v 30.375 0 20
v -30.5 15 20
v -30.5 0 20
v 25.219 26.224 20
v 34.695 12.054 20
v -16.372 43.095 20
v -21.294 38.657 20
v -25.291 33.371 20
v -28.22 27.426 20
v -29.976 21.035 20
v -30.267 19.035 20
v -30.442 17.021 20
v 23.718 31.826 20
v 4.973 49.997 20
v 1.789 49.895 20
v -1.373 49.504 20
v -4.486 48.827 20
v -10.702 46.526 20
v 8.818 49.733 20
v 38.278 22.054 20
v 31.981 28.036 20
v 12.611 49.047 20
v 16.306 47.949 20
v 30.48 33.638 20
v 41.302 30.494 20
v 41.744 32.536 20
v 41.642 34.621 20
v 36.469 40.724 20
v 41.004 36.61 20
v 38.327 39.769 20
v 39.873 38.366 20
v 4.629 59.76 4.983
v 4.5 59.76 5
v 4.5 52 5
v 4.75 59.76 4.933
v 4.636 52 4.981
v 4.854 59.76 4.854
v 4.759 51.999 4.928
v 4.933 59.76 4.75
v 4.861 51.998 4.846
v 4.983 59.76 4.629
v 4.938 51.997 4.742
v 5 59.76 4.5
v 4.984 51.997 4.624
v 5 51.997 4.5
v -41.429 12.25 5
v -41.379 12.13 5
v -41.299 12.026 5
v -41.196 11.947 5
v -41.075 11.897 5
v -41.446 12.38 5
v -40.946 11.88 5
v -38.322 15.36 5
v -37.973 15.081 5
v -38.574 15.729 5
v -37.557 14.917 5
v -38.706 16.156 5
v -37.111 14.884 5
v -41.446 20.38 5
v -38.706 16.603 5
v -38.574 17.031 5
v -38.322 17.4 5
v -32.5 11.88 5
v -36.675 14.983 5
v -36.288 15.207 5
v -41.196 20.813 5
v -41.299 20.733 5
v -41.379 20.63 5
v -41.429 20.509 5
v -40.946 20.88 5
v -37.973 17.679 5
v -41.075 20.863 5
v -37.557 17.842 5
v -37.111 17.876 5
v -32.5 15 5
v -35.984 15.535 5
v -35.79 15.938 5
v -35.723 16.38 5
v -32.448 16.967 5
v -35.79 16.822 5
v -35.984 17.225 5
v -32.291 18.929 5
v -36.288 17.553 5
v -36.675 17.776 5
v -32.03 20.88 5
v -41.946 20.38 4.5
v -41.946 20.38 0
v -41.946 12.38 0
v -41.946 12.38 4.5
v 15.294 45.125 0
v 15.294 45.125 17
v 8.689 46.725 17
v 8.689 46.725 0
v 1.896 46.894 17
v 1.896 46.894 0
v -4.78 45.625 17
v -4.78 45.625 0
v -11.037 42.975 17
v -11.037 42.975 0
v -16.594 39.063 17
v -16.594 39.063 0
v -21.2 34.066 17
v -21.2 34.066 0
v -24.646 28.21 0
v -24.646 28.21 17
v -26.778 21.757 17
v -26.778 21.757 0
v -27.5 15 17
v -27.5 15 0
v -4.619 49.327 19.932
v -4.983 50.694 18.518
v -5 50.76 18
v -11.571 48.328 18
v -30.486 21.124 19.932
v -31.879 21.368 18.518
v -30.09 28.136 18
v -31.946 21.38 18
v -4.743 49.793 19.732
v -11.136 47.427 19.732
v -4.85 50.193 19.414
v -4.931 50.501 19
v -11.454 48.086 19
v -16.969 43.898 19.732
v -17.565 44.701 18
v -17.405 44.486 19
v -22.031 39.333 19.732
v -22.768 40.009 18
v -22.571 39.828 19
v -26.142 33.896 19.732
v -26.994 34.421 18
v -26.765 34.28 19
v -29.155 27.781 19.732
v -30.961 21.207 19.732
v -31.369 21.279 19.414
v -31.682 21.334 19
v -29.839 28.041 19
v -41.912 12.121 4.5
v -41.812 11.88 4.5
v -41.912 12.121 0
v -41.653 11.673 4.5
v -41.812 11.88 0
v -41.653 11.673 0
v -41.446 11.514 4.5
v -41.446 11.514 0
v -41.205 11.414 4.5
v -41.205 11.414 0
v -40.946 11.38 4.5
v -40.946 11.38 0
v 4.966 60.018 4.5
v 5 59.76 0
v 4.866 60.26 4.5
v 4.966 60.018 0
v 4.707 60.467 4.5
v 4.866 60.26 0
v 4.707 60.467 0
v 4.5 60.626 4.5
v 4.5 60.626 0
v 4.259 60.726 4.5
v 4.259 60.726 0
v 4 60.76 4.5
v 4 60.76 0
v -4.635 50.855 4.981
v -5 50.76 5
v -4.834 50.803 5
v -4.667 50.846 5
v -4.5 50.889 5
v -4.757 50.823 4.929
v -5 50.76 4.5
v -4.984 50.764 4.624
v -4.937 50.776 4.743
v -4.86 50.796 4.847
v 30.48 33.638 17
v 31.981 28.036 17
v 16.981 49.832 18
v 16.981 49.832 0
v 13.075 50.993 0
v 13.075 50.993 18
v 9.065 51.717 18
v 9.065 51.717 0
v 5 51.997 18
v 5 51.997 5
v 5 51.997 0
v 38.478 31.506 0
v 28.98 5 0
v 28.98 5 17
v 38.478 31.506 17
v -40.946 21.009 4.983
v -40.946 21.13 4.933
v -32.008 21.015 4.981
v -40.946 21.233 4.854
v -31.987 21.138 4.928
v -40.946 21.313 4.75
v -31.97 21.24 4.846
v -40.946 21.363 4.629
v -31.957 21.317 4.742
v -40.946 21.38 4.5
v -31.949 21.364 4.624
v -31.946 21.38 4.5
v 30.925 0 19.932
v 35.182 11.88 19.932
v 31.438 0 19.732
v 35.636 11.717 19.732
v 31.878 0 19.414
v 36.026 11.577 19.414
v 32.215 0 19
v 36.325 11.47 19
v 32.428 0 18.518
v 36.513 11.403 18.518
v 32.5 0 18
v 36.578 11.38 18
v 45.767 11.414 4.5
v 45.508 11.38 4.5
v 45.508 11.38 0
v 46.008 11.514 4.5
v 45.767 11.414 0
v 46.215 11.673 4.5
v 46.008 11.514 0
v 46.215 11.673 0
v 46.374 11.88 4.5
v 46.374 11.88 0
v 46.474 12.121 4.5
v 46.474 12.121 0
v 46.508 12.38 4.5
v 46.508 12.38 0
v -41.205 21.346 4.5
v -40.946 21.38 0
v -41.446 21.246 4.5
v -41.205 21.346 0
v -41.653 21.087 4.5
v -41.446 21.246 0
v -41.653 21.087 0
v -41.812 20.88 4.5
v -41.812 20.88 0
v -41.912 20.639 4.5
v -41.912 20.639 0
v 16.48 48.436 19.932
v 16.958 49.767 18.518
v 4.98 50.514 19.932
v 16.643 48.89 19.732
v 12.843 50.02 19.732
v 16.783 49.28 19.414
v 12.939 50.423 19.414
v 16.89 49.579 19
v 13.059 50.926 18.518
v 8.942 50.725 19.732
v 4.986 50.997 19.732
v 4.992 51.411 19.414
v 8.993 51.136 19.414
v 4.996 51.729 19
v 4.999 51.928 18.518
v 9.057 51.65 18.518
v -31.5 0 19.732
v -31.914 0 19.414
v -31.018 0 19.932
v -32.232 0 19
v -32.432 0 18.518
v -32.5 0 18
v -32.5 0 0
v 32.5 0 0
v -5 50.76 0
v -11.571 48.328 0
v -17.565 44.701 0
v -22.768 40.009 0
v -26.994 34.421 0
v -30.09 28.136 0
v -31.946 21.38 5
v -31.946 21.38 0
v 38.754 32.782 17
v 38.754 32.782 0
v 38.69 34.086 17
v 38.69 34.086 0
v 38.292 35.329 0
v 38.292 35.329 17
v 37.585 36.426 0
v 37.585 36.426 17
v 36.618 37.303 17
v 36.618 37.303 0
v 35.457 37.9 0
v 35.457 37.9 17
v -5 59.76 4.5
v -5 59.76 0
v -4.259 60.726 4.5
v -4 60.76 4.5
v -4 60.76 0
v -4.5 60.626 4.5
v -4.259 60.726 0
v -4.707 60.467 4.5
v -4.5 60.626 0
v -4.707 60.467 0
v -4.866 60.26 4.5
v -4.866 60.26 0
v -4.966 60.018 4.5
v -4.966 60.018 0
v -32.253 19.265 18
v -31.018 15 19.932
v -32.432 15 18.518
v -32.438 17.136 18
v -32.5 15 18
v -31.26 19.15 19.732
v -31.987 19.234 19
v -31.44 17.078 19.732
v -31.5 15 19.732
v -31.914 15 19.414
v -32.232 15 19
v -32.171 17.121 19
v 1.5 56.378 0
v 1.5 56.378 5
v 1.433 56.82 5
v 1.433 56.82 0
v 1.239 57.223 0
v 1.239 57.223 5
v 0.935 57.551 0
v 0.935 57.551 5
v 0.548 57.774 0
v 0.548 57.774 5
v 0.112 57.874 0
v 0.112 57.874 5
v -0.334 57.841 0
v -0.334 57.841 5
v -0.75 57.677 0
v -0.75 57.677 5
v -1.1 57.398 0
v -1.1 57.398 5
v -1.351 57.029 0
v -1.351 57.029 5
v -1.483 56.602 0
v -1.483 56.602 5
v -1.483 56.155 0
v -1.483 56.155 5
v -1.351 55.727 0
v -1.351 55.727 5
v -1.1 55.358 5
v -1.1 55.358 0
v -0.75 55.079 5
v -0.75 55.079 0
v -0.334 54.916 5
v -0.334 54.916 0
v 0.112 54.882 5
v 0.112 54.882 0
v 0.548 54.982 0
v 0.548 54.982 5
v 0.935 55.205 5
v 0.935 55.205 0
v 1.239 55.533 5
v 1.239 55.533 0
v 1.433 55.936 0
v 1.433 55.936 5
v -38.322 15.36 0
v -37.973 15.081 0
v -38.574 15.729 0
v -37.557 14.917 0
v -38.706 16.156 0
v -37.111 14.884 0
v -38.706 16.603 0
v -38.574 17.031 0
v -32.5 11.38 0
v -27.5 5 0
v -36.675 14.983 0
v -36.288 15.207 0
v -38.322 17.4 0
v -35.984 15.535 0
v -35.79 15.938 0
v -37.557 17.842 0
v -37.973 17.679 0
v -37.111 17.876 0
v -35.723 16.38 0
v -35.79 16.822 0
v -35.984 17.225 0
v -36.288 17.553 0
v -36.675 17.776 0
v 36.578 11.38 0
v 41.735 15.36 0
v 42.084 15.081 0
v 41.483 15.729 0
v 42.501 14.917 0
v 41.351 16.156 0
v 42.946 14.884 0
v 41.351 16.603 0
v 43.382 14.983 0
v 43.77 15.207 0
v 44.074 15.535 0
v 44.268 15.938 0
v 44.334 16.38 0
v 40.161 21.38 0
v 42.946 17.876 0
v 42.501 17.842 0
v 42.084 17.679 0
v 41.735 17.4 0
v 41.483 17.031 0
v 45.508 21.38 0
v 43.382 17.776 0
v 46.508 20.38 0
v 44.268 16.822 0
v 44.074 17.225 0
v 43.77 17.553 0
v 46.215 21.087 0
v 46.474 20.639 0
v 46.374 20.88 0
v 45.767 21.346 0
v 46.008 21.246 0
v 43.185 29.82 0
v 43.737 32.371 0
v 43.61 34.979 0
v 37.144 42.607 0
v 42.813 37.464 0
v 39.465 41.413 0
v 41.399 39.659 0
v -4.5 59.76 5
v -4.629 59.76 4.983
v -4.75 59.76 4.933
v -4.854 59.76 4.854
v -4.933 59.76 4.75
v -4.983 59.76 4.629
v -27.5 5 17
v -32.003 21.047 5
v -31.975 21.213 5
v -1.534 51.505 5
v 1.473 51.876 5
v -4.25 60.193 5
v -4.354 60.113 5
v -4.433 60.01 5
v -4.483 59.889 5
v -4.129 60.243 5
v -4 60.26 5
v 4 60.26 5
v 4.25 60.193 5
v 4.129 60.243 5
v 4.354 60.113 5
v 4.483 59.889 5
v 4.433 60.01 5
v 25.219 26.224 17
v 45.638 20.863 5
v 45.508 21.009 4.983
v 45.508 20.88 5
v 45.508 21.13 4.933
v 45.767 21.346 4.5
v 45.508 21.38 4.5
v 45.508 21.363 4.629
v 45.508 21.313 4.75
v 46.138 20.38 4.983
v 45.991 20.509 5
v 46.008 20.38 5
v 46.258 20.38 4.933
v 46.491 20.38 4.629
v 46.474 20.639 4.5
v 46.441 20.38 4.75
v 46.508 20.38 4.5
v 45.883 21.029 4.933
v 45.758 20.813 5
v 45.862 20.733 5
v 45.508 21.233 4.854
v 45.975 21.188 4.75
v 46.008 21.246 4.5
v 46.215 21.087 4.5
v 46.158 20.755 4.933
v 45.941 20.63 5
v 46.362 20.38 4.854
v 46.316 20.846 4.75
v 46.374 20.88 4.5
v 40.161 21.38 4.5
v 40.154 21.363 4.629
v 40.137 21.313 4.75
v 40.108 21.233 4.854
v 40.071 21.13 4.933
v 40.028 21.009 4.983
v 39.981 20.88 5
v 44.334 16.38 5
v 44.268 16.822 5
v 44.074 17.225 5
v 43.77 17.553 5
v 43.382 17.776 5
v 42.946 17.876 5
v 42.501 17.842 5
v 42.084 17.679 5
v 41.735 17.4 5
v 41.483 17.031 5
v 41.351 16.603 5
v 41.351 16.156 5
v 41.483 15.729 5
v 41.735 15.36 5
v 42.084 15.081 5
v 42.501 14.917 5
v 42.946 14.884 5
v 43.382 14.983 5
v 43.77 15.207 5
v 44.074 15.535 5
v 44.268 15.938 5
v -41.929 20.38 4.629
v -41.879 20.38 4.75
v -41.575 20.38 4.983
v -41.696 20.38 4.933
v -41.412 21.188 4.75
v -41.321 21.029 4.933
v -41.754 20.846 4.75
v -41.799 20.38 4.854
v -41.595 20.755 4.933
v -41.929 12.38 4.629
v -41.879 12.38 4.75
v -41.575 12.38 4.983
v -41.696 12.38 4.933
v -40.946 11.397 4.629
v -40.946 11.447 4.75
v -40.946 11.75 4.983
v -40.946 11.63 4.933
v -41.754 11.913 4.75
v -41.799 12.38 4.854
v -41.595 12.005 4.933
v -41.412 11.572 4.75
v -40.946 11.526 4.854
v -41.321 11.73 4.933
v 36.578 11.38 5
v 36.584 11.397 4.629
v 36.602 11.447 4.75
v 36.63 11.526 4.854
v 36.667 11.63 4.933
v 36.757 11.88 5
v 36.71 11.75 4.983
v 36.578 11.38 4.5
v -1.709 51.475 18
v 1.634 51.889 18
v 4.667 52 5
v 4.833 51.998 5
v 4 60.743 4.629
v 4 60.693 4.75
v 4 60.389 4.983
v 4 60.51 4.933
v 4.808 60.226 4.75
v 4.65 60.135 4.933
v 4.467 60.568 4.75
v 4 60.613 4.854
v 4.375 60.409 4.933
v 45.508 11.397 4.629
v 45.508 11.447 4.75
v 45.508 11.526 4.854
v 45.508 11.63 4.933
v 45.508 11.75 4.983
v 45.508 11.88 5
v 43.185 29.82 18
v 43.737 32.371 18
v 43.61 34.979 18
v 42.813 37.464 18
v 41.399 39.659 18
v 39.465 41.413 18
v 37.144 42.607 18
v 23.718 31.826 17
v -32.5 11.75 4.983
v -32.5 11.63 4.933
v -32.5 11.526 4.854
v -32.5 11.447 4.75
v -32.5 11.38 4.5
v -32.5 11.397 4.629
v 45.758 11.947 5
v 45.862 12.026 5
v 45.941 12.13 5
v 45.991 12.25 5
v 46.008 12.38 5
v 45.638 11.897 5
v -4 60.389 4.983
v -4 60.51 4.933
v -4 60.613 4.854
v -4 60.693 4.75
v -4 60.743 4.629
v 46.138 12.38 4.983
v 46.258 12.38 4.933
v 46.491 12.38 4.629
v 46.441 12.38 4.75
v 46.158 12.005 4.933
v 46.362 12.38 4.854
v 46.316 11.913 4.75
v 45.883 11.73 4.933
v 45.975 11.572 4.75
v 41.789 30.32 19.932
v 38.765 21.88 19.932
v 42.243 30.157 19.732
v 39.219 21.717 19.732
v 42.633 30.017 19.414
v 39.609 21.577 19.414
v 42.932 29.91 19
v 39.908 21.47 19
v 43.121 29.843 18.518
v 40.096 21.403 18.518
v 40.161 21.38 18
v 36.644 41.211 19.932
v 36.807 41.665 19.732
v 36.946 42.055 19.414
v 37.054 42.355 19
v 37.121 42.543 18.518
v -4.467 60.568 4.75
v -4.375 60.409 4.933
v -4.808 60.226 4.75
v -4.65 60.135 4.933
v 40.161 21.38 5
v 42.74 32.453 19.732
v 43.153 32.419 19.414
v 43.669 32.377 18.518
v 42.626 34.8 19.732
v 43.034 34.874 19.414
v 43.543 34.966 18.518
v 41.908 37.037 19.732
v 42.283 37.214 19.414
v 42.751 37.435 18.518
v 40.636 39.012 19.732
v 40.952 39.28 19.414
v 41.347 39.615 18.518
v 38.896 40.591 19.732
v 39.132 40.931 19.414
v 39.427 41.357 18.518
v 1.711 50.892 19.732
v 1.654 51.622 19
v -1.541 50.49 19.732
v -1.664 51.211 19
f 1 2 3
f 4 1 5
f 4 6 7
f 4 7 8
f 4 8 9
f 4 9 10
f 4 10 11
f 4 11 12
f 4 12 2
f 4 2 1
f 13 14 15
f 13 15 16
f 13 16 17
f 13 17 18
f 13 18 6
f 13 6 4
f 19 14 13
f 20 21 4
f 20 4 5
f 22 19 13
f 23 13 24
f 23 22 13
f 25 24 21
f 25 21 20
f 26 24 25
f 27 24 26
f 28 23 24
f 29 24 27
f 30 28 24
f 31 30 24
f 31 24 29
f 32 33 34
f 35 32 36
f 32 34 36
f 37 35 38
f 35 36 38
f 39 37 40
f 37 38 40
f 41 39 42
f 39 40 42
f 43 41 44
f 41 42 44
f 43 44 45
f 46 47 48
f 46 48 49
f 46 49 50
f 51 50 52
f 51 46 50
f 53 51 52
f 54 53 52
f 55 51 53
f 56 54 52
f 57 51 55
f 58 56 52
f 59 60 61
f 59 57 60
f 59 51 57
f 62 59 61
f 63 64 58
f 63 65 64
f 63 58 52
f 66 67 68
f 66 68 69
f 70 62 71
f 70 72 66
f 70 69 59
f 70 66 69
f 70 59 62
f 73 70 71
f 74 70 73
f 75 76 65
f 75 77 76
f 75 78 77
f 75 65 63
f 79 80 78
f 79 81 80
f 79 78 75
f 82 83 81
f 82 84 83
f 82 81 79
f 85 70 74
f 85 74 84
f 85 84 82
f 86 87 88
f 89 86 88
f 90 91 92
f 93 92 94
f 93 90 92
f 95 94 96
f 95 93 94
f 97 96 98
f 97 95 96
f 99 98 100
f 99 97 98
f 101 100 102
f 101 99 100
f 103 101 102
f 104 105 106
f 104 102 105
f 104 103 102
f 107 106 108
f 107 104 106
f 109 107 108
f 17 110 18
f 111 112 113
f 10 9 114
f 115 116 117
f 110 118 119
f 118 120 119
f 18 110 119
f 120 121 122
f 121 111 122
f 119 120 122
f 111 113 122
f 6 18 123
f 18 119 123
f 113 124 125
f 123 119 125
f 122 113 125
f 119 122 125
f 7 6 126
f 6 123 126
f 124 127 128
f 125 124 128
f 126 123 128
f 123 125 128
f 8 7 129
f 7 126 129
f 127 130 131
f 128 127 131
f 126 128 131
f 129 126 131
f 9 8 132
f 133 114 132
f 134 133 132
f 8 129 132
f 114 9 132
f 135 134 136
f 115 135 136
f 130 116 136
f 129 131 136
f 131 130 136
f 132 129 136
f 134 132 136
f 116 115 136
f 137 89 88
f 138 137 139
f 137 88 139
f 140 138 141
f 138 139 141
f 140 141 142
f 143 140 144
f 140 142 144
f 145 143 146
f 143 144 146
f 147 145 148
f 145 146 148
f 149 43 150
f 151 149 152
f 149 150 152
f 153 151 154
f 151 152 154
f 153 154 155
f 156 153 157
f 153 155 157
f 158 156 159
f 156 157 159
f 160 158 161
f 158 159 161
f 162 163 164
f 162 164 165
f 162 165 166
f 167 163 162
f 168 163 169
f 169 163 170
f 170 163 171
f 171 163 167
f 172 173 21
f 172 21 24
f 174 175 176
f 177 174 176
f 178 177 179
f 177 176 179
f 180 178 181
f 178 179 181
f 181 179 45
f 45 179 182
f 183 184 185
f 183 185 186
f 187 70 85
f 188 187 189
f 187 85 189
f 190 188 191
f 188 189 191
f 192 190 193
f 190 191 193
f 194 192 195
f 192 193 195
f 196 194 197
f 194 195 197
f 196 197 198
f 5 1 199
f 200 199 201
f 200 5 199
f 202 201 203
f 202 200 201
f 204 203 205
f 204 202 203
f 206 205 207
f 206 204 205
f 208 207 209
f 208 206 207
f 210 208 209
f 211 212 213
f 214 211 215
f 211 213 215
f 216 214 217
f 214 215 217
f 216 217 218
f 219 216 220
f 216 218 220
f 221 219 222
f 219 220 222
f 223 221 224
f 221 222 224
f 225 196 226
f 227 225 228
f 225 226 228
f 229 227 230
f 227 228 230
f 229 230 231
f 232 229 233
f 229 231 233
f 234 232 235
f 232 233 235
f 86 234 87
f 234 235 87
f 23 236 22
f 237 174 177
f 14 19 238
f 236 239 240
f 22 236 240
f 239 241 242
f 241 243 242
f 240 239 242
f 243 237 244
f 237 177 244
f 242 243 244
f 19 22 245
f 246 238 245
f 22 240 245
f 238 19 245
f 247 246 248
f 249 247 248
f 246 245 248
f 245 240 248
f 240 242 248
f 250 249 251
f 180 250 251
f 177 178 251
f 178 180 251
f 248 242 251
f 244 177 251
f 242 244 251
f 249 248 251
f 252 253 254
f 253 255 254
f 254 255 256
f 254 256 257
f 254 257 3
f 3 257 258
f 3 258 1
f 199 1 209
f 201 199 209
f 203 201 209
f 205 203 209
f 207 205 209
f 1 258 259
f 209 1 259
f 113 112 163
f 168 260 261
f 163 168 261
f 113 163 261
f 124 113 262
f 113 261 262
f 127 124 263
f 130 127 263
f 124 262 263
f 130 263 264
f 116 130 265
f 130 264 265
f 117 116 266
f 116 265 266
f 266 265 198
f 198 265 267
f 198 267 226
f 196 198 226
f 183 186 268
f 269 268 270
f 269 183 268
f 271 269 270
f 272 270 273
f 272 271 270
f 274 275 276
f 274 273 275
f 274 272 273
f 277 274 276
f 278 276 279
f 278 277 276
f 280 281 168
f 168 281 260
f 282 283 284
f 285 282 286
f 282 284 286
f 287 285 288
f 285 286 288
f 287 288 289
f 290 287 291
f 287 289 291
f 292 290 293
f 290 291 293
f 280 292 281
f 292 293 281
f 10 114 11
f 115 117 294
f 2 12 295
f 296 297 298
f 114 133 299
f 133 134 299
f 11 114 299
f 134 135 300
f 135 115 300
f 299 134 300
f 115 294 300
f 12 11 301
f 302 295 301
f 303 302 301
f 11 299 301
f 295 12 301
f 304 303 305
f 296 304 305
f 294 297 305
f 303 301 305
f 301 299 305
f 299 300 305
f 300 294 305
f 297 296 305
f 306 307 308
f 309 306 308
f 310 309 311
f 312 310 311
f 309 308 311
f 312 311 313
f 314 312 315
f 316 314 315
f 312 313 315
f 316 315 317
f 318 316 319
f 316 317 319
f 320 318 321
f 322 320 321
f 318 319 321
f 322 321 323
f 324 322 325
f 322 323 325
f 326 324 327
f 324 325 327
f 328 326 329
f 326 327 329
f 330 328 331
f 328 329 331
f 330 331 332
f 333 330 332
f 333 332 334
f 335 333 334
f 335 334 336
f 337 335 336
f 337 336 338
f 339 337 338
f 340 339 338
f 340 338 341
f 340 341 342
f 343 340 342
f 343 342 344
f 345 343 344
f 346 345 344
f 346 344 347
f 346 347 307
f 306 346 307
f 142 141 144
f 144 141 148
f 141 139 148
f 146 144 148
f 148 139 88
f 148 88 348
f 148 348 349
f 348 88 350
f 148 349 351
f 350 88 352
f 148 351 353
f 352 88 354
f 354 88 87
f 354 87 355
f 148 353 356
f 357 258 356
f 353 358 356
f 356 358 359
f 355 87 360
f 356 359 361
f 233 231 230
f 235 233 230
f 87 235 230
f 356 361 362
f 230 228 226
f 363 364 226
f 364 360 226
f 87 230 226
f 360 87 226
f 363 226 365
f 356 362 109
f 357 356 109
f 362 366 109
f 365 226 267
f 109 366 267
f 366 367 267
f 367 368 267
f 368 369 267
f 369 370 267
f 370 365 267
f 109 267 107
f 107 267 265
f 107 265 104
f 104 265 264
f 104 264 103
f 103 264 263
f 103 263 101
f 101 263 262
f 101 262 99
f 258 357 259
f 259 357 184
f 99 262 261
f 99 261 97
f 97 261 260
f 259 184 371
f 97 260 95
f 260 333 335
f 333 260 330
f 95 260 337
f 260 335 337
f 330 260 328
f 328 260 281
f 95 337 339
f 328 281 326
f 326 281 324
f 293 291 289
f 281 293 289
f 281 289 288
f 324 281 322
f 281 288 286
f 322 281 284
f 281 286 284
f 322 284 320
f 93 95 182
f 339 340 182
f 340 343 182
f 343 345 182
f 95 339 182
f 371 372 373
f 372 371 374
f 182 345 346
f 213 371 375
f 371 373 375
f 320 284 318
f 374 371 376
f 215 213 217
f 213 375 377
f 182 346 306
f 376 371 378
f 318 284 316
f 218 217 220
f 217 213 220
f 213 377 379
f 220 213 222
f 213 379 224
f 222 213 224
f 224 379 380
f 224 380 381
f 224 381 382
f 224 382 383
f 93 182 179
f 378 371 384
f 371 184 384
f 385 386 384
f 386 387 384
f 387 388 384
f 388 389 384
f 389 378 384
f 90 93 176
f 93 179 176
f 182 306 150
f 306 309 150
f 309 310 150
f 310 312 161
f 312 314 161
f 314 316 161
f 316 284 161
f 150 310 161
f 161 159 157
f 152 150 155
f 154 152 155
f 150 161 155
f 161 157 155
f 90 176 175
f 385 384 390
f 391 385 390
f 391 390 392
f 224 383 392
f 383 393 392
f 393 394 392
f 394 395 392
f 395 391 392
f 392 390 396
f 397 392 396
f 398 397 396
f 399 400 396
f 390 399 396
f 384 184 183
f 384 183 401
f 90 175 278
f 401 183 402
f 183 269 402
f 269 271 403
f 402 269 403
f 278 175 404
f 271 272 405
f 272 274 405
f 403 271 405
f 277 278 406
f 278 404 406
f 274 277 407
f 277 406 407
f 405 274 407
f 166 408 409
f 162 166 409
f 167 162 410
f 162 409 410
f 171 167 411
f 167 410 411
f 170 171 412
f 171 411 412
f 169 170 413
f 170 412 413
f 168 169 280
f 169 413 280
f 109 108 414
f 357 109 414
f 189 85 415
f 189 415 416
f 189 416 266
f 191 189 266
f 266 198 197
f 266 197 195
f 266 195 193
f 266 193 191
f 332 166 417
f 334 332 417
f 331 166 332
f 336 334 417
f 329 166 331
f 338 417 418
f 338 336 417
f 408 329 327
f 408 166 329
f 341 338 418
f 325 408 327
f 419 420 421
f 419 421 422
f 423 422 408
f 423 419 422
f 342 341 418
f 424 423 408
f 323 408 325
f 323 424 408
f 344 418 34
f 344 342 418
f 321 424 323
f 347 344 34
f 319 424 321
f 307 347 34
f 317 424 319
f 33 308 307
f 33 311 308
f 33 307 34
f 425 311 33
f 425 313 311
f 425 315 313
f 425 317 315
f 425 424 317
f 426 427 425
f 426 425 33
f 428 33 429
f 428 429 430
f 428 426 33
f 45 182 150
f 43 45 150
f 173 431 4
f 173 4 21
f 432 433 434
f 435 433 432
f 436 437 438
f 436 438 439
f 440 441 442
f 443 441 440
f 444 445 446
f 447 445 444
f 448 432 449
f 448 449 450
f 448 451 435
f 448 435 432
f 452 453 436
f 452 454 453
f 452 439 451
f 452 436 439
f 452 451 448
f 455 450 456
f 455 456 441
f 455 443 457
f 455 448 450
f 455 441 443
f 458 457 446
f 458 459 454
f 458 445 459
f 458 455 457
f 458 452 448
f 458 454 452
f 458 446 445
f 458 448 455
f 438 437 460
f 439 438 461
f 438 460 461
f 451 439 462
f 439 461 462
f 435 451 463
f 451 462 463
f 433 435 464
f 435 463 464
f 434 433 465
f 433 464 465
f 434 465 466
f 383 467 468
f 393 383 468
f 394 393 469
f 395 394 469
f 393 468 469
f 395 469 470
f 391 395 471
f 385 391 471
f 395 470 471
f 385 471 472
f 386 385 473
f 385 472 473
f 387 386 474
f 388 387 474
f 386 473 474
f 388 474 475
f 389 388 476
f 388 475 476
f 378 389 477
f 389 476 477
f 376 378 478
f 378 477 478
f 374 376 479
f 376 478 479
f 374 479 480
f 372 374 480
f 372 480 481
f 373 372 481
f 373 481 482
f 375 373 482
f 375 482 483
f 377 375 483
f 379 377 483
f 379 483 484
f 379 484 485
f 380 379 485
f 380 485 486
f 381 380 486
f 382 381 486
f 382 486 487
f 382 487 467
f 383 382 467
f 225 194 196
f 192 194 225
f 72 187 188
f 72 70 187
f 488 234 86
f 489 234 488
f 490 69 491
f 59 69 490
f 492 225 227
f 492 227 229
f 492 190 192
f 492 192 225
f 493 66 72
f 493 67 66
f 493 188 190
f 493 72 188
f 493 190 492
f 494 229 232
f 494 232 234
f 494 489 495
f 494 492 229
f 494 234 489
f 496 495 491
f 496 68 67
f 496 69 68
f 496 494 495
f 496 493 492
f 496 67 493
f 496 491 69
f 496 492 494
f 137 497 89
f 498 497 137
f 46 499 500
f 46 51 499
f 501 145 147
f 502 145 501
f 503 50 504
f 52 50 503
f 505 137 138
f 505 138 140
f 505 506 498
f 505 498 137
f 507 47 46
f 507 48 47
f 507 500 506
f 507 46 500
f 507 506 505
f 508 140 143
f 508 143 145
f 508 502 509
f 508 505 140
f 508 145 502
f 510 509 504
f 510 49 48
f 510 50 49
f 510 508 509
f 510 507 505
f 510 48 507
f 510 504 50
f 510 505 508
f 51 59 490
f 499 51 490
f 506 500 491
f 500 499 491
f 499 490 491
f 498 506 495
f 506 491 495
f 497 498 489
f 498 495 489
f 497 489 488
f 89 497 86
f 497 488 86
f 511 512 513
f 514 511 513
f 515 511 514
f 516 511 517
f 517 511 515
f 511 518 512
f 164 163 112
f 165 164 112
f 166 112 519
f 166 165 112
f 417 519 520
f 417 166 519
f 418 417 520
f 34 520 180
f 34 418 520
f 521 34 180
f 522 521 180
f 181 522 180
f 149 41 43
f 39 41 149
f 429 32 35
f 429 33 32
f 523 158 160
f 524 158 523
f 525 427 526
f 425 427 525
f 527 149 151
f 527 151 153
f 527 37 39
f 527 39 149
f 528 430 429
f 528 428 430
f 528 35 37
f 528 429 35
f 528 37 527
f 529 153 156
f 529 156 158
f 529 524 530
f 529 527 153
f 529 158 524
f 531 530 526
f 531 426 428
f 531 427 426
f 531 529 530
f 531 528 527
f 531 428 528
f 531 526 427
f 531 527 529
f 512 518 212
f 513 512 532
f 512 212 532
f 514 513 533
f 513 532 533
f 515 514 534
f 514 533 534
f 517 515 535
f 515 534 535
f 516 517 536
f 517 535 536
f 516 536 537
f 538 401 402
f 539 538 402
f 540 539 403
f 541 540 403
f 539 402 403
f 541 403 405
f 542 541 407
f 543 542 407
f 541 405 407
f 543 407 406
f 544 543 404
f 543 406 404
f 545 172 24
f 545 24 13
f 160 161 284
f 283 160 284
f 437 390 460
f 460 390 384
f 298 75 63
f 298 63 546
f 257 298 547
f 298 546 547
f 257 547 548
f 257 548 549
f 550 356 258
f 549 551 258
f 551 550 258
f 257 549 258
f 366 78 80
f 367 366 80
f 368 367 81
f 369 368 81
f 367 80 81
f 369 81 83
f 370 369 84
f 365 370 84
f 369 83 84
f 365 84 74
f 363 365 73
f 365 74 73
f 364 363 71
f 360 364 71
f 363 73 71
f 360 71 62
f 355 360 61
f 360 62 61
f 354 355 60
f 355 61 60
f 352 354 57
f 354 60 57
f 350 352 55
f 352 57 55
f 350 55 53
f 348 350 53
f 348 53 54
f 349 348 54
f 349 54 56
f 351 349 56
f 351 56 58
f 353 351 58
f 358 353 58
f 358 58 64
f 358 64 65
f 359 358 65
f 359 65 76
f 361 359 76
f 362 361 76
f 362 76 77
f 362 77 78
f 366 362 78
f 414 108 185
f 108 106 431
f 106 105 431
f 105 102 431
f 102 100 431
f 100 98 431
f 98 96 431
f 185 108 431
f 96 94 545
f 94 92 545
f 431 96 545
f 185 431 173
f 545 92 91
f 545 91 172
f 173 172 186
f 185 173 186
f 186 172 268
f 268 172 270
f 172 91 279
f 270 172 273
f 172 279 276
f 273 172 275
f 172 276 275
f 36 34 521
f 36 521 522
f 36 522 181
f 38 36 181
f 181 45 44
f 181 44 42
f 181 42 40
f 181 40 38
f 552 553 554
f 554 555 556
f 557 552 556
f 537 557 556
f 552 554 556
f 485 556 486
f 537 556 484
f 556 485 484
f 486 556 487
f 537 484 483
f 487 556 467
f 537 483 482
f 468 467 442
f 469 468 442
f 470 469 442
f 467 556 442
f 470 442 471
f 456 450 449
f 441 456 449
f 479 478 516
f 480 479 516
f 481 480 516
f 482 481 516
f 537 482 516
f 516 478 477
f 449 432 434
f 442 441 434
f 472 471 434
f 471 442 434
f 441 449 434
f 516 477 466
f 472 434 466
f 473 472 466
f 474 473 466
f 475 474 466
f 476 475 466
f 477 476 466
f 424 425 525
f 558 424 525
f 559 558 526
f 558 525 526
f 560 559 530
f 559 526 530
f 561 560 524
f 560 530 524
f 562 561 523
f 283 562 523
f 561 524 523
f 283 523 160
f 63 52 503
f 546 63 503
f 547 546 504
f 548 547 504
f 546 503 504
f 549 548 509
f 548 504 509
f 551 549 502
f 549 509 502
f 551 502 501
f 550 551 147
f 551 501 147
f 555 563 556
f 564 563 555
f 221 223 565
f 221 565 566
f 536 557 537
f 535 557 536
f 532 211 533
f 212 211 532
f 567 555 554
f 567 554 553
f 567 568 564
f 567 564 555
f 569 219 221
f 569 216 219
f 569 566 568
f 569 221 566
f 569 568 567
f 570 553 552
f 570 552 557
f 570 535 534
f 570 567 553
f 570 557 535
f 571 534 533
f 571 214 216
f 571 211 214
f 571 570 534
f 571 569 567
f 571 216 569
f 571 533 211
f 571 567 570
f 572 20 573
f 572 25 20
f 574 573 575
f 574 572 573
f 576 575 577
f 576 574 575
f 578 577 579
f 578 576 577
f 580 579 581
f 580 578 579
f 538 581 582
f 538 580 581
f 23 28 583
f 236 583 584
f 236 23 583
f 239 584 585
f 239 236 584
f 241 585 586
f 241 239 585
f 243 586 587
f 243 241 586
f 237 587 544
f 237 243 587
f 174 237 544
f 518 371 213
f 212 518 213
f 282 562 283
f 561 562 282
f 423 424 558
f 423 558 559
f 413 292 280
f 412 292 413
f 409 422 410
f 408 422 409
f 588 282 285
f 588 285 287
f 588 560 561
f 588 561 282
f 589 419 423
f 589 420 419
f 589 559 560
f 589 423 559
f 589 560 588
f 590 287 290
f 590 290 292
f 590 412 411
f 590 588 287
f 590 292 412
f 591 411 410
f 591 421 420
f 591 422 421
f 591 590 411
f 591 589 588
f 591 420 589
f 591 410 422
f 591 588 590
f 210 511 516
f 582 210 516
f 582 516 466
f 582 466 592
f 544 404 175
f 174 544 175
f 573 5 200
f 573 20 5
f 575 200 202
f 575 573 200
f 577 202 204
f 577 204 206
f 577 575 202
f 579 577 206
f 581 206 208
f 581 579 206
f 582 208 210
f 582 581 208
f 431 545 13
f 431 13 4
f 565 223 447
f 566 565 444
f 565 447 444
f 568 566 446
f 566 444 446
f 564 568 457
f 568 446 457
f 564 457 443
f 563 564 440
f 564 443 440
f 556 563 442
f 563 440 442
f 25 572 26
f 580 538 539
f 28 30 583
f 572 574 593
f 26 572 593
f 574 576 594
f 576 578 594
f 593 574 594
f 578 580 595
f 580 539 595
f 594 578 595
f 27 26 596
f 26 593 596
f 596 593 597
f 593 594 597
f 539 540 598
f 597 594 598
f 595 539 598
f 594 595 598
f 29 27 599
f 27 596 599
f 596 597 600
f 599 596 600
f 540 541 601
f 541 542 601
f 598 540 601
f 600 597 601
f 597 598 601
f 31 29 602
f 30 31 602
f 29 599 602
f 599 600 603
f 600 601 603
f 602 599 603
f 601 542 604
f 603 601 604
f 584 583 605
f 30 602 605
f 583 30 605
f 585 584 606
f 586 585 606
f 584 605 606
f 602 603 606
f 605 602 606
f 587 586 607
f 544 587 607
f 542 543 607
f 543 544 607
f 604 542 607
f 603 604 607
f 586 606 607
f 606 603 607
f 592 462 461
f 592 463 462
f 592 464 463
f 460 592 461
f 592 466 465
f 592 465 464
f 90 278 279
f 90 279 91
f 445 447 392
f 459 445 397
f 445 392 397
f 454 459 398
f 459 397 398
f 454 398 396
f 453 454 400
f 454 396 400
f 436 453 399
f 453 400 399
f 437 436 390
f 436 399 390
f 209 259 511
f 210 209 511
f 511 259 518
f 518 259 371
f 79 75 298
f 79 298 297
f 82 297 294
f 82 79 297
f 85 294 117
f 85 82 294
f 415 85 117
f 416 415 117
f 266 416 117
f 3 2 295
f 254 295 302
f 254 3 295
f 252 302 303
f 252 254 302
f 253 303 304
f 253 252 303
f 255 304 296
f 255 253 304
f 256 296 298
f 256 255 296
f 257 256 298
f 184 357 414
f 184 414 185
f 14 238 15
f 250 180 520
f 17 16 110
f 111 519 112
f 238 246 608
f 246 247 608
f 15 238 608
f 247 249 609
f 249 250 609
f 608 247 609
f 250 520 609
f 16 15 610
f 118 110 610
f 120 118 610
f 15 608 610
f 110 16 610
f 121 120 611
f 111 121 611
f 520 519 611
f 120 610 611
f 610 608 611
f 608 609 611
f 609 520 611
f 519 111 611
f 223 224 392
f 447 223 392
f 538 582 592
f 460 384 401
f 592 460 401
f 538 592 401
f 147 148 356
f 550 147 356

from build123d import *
from build123d.topology import SkipClean

# Parameters (mm, degrees)
BOSS_EXTRU_1_DEPTH      = 20
BOSS_EXTRU_3_START      = -3
BOSS_EXTRU_3_DEPTH      = 3
ENL_V_MAT_EXTRU_3_DEPTH = 3
ENL_V_START             = -15
ENL_V_MAT_EXTRU_4_DEPTH = 15
ESQUISSE10_R            = 1.5
ENL_V_MAT_EXTRU_5_DEPTH = 78.972696085
CONG_1_R                = 2
CONG_2_R                = 0.5


with BuildPart() as part:
    # Esquisse1 → Boss.-Extru.1 (new body)
    with BuildSketch(Plane.XY):
        with BuildLine():
            Line((-32.5, 11.379807046), (-32.5, 0))
            Line((-32.5, 0), (32.5, 0))
            Line((32.5, 0), (36.577501058, 11.379807046))
            Line((36.577501058, 11.379807046), (45.5081781, 11.379807046))
            ThreePointArc((45.5081781, 11.379807046), (46.215284881, 11.672700265), (46.5081781, 12.379807046))
            Line((46.5081781, 12.379807046), (46.5081781, 20.379807046))
            ThreePointArc((46.5081781, 20.379807046), (46.215284881, 21.086913827), (45.5081781, 21.379807046))
            Line((45.5081781, 21.379807046), (40.160603163, 21.379807046))
            Line((40.160603163, 21.379807046), (43.184724439, 29.819759876))
            ThreePointArc((43.184724439, 29.819759876), (42.812595053, 37.46437651), (37.143899579, 42.60680156))
            Line((37.143899579, 42.60680156), (16.980501125, 49.831553104))
            ThreePointArc((16.980501125, 49.831553104), (11.079911293, 51.410228884), (5, 51.996621467))
            Line((5, 51.996621467), (5, 59.759614092))
            ThreePointArc((5, 59.759614092), (4.707106781, 60.466720873), (4, 60.759614092))
            Line((4, 60.759614092), (-4, 60.759614092))
            ThreePointArc((-4, 60.759614092), (-4.707106781, 60.466720873), (-5, 59.759614092))
            Line((-5, 59.759614092), (-5, 50.759614092))
            ThreePointArc((-5, 50.759614092), (-22.768075535, 40.009039498), (-31.945823657, 21.379807046))
            Line((-31.945823657, 21.379807046), (-40.945823657, 21.379807046))
            ThreePointArc((-40.945823657, 21.379807046), (-41.652930438, 21.086913827), (-41.945823657, 20.379807046))
            Line((-41.945823657, 20.379807046), (-41.945823657, 12.379807046))
            ThreePointArc((-41.945823657, 12.379807046), (-41.652930438, 11.672700265), (-40.945823657, 11.379807046))
            Line((-40.945823657, 11.379807046), (-32.5, 11.379807046))
        make_face()
        with BuildLine():
            Line((-27.5, 15), (-27.5, 5))
            Line((-27.5, 5), (28.980274824, 5))
            Line((28.980274824, 5), (38.477757803, 31.506314082))
            ThreePointArc((38.477757803, 31.506314082), (38.29169311, 35.328622399), (35.457345373, 37.899834924))
            Line((35.457345373, 37.899834924), (15.293946919, 45.124586469))
            ThreePointArc((15.293946919, 45.124586469), (-13.920012196, 41.166833028), (-27.5, 15))
        make_face(mode=Mode.SUBTRACT)
    extrude(amount=BOSS_EXTRU_1_DEPTH)

    # Esquisse5 → Boss.-Extru.3 (add)
    with BuildSketch(Plane.XY.offset(20).offset(BOSS_EXTRU_3_START)):
        with BuildLine():
            Line((-32.5, 11.379807046), (-32.5, 0))
            Line((-32.5, 0), (32.5, 0))
            Line((32.5, 0), (36.577501058, 11.379807046))
            Line((36.577501058, 11.379807046), (45.5081781, 11.379807046))
            ThreePointArc((45.5081781, 11.379807046), (46.215284881, 11.672700265), (46.5081781, 12.379807046))
            Line((46.5081781, 12.379807046), (46.5081781, 20.379807046))
            ThreePointArc((46.5081781, 20.379807046), (46.215284881, 21.086913827), (45.5081781, 21.379807046))
            Line((45.5081781, 21.379807046), (40.160603163, 21.379807046))
            Line((40.160603163, 21.379807046), (43.184724439, 29.819759876))
            ThreePointArc((43.184724439, 29.819759876), (42.812595053, 37.46437651), (37.143899579, 42.60680156))
            Line((37.143899579, 42.60680156), (16.980501125, 49.831553104))
            ThreePointArc((16.980501125, 49.831553104), (11.079911293, 51.410228884), (5, 51.996621467))
            Line((5, 51.996621467), (5, 59.759614092))
            ThreePointArc((5, 59.759614092), (4.707106781, 60.466720873), (4, 60.759614092))
            Line((4, 60.759614092), (-4, 60.759614092))
            ThreePointArc((-4, 60.759614092), (-4.707106781, 60.466720873), (-5, 59.759614092))
            Line((-5, 59.759614092), (-5, 50.759614092))
            ThreePointArc((-5, 50.759614092), (-22.768075535, 40.009039498), (-31.945823657, 21.379807046))
            Line((-31.945823657, 21.379807046), (-40.945823657, 21.379807046))
            ThreePointArc((-40.945823657, 21.379807046), (-41.652930438, 21.086913827), (-41.945823657, 20.379807046))
            Line((-41.945823657, 20.379807046), (-41.945823657, 12.379807046))
            ThreePointArc((-41.945823657, 12.379807046), (-41.652930438, 11.672700265), (-40.945823657, 11.379807046))
            Line((-40.945823657, 11.379807046), (-32.5, 11.379807046))
        make_face()
    extrude(amount=BOSS_EXTRU_3_DEPTH)

    # Esquisse6 → Enlèv. mat.-Extru.3 (cut)
    with BuildSketch(Plane(origin=(0, 0, 17), x_dir=(-1, 0, 0), z_dir=(0, 0, -1))):
        Polygon((-30.479635706, 33.638207866), (-23.718154922, 31.82647455), (-25.219305384, 26.224104758), (-31.980786168, 28.035838073), align=None)
    extrude(amount=-ENL_V_MAT_EXTRU_3_DEPTH, mode=Mode.SUBTRACT)

    # Esquisse9 → Enlèv. mat.-Extru.4 (cut)
    with SkipClean():  # the faces are left unmerged after this step: merging them gives an invalid solid
        with BuildSketch(Plane.XY.offset(20).offset(ENL_V_START)):
            with BuildLine():
                Line((5, 51.996621467), (5, 59.759614092))
                ThreePointArc((5, 59.759614092), (4.707106781, 60.466720873), (4, 60.759614092))
                Line((4, 60.759614092), (-4, 60.759614092))
                ThreePointArc((-4, 60.759614092), (-4.707106781, 60.466720873), (-5, 59.759614092))
                Line((-5, 59.759614092), (-5, 50.759614092))
                ThreePointArc((-5, 50.759614092), (-0.042306332, 51.720123273), (5, 51.996621467))
            make_face()
            with BuildLine():
                Line((-31.945823657, 21.379807046), (-40.945823657, 21.379807046))
                ThreePointArc((-40.945823657, 21.379807046), (-41.652930438, 21.086913827), (-41.945823657, 20.379807046))
                Line((-41.945823657, 20.379807046), (-41.945823657, 12.379807046))
                ThreePointArc((-41.945823657, 12.379807046), (-41.652930438, 11.672700265), (-40.945823657, 11.379807046))
                Line((-40.945823657, 11.379807046), (-32.5, 11.379807046))
                Line((-32.5, 11.379807046), (-32.5, 15))
                ThreePointArc((-32.5, 15), (-32.361195554, 18.201915417), (-31.945823657, 21.379807046))
            make_face()
            with BuildLine():
                Line((36.577501058, 11.379807046), (40.160603163, 21.379807046))
                Line((40.160603163, 21.379807046), (45.5081781, 21.379807046))
                ThreePointArc((45.5081781, 21.379807046), (46.215284881, 21.086913827), (46.5081781, 20.379807046))
                Line((46.5081781, 20.379807046), (46.5081781, 12.379807046))
                ThreePointArc((46.5081781, 12.379807046), (46.215284881, 11.672700265), (45.5081781, 11.379807046))
                Line((45.5081781, 11.379807046), (36.577501058, 11.379807046))
            make_face()
        extrude(amount=ENL_V_MAT_EXTRU_4_DEPTH, mode=Mode.SUBTRACT)

    # Esquisse10 → Enlèv. mat.-Extru.5 (cut, through all)
    with SkipClean():  # the faces are left unmerged after this step: merging them gives an invalid solid
        with BuildSketch(Plane.XY.offset(5)):
            with Locations((-37.222911829, 16.379807046)):
                Circle(ESQUISSE10_R)
            with Locations((0, 56.37811778)):
                Circle(ESQUISSE10_R)
            with Locations((42.834390632, 16.379807046)):
                Circle(ESQUISSE10_R)
        extrude(amount=-ENL_V_MAT_EXTRU_5_DEPTH, mode=Mode.SUBTRACT)

    # Congé1
    cong_1_edges = [part.edges().sort_by_distance(p)[0] for p in [
        (-22.768075535, 40.009039498, 20),
        (42.812595053, 37.46437651, 20),
        (-32.5, 5.689903523, 20),
        (38.369052111, 16.379807046, 20),
        (27.062200352, 46.219177332, 20),
    ]]
    fillet(cong_1_edges, radius=CONG_1_R)

    # Congé2
    # the kernel refuses this fillet: 0.5 mm, written as the material it takes off along each edge
    with BuildSketch(Plane(origin=(-40.945823657, 11.379807046, 5), x_dir=(0, 1, 0), z_dir=(1, 0, 0))) as cong_2_piece_1:
        with BuildLine():
            CenterArc((CONG_2_R, -CONG_2_R), CONG_2_R, 90, 90)
            Line((0, -CONG_2_R), (0, 0))
            Line((0, 0), (CONG_2_R, 0))
        make_face()
    extrude(amount=8.445823657, mode=Mode.SUBTRACT)
    with BuildSketch(Plane(origin=(-40.945823657, 12.379807046, 5), x_dir=(-1, 0, 0), z_dir=(0, 1, 0))) as cong_2_piece_2:
        with BuildLine():
            CenterArc((1 - CONG_2_R, -CONG_2_R), CONG_2_R, 0, 90)
            Line((1 - CONG_2_R, 0), (1, 0))
            Line((1, 0), (1, -CONG_2_R))
        make_face()
    revolve(axis=Axis((-40.945823657, 12.379807046, 5), (0, 0, 1)), revolution_arc=90, mode=Mode.SUBTRACT)
    with BuildSketch(Plane(origin=(-41.945823657, 20.379807046, 5), x_dir=(0, 0, -1), z_dir=(0, -1, 0)), Plane(origin=(4, 60.759614092, 5), x_dir=(0, 0, -1), z_dir=(-1, 0, 0))) as cong_2_piece_3:
        with BuildLine():
            CenterArc((CONG_2_R, CONG_2_R), CONG_2_R, 180, 90)
            Line((0, CONG_2_R), (0, 0))
            Line((0, 0), (CONG_2_R, 0))
        make_face()
    extrude(amount=8, mode=Mode.SUBTRACT)
    with BuildSketch(Plane(origin=(-40.945823657, 20.379807046, 5), x_dir=(0, 1, 0), z_dir=(1, 0, 0))) as cong_2_piece_4:
        with BuildLine():
            CenterArc((1 - CONG_2_R, -CONG_2_R), CONG_2_R, 0, 90)
            Line((1 - CONG_2_R, 0), (1, 0))
            Line((1, 0), (1, -CONG_2_R))
        make_face()
    revolve(axis=Axis((-40.945823657, 20.379807046, 5), (0, 0, 1)), revolution_arc=90, mode=Mode.SUBTRACT)
    with BuildSketch(Plane(origin=(-30.695823657, 21.379807046, 5), x_dir=(0, 0, -1), z_dir=(-1, 0, 0))) as cong_2_piece_5_section:
        with BuildLine():
            CenterArc((CONG_2_R, CONG_2_R), CONG_2_R, 180, 90)
            Line((0, CONG_2_R), (0, 0))
            Line((0, 0), (CONG_2_R, 0))
        make_face()
    cong_2_piece_5 = extrude(amount=10.25, mode=Mode.PRIVATE)
    cong_2_piece_5 = cong_2_piece_5 - Plane(origin=(4.5, 15, 4.88667184), x_dir=(-1, 0, 0), z_dir=(0, 0, -1)) * Cylinder(37, 23, mode=Mode.PRIVATE)
    add(cong_2_piece_5, mode=Mode.SUBTRACT)
    with BuildSketch(Plane(origin=(-5, 59.759614092, 5), x_dir=(0, 0, -1), z_dir=(0, -1, 0))) as cong_2_piece_6_section:
        with BuildLine():
            CenterArc((CONG_2_R, CONG_2_R), CONG_2_R, 180, 90)
            Line((0, CONG_2_R), (0, 0))
            Line((0, 0), (CONG_2_R, 0))
        make_face()
    cong_2_piece_6 = extrude(amount=10.25, mode=Mode.PRIVATE)
    cong_2_piece_6 = cong_2_piece_6 - Plane(origin=(4.5, 15, 4.886602511), x_dir=(-1, 0, 0), z_dir=(0, 0, -1)) * Cylinder(37, 23, mode=Mode.PRIVATE)
    add(cong_2_piece_6, mode=Mode.SUBTRACT)
    with BuildSketch(Plane(origin=(-4, 59.759614092, 5), x_dir=(0, 1, 0), z_dir=(1, 0, 0))) as cong_2_piece_7:
        with BuildLine():
            CenterArc((1 - CONG_2_R, -CONG_2_R), CONG_2_R, 0, 90)
            Line((1 - CONG_2_R, 0), (1, 0))
            Line((1, 0), (1, -CONG_2_R))
        make_face()
    revolve(axis=Axis((-4, 59.759614092, 5), (0, 0, 1)), revolution_arc=90, mode=Mode.SUBTRACT)
    with BuildSketch(Plane(origin=(4, 59.759614092, 5), x_dir=(1, 0, 0), z_dir=(0, -1, 0))) as cong_2_piece_8:
        with BuildLine():
            CenterArc((1 - CONG_2_R, -CONG_2_R), CONG_2_R, 0, 90)
            Line((1 - CONG_2_R, 0), (1, 0))
            Line((1, 0), (1, -CONG_2_R))
        make_face()
    revolve(axis=Axis((4, 59.759614092, 5), (0, 0, 1)), revolution_arc=90, mode=Mode.SUBTRACT)
    with BuildSketch(Plane(origin=(5, 50.746621467, 5), x_dir=(0, 0, -1), z_dir=(0, 1, 0))) as cong_2_piece_9_section:
        with BuildLine():
            CenterArc((CONG_2_R, CONG_2_R), CONG_2_R, 180, 90)
            Line((0, CONG_2_R), (0, 0))
            Line((0, 0), (CONG_2_R, 0))
        make_face()
    cong_2_piece_9 = extrude(amount=9.012992625, mode=Mode.PRIVATE)
    cong_2_piece_9 = cong_2_piece_9 - Plane(origin=(4.5, 15, 4.886794032), x_dir=(-1, 0, 0), z_dir=(0, 0, -1)) * Cylinder(37, 21, mode=Mode.PRIVATE)
    add(cong_2_piece_9, mode=Mode.SUBTRACT)
    with BuildSketch(Plane(origin=(38.910603163, 21.379807046, 5), x_dir=(0, -1, 0), z_dir=(1, 0, 0))) as cong_2_piece_10_section:
        with BuildLine():
            CenterArc((CONG_2_R, CONG_2_R), CONG_2_R, 180, 90)
            Line((0, CONG_2_R), (0, 0))
            Line((0, 0), (CONG_2_R, 0))
        make_face()
    cong_2_piece_10 = extrude(amount=6.597574937, mode=Mode.PRIVATE)
    cong_2_piece_10 = split(cong_2_piece_10, bisect_by=Plane(origin=(40.426309442, 22.121360792, 4.88725891), z_dir=(0.9413933271437573, -0.3373108412269116, 0)), keep=Keep.TOP, mode=Mode.PRIVATE)
    add(cong_2_piece_10, mode=Mode.SUBTRACT)
    with BuildSketch(Plane(origin=(45.5081781, 20.379807046, 5), x_dir=(0, 1, 0), z_dir=(-1, 0, 0))) as cong_2_piece_11:
        with BuildLine():
            CenterArc((1 - CONG_2_R, CONG_2_R), CONG_2_R, 270, 90)
            Line((1 - CONG_2_R, 0), (1, 0))
            Line((1, 0), (1, CONG_2_R))
        make_face()
    revolve(axis=Axis((45.5081781, 20.379807046, 5), (0, 0, -1)), revolution_arc=90, mode=Mode.SUBTRACT)
    with BuildSketch(Plane(origin=(46.5081781, 20.379807046, 5), x_dir=(0, 0, -1), z_dir=(0, -1, 0))) as cong_2_piece_12:
        with BuildLine():
            CenterArc((CONG_2_R, -CONG_2_R), CONG_2_R, 90, 90)
            Line((0, -CONG_2_R), (0, 0))
            Line((0, 0), (CONG_2_R, 0))
        make_face()
    extrude(amount=8, mode=Mode.SUBTRACT)
    with BuildSketch(Plane(origin=(45.5081781, 12.379807046, 5), x_dir=(1, 0, 0), z_dir=(0, 1, 0))) as cong_2_piece_13:
        with BuildLine():
            CenterArc((1 - CONG_2_R, CONG_2_R), CONG_2_R, 270, 90)
            Line((1 - CONG_2_R, 0), (1, 0))
            Line((1, 0), (1, CONG_2_R))
        make_face()
    revolve(axis=Axis((45.5081781, 12.379807046, 5), (0, 0, -1)), revolution_arc=90, mode=Mode.SUBTRACT)
    with BuildSketch(Plane(origin=(45.5081781, 11.379807046, 5), x_dir=(0, 0, -1), z_dir=(-1, 0, 0))) as cong_2_piece_14_section:
        with BuildLine():
            CenterArc((CONG_2_R, -CONG_2_R), CONG_2_R, 90, 90)
            Line((0, -CONG_2_R), (0, 0))
            Line((0, 0), (CONG_2_R, 0))
        make_face()
    cong_2_piece_14 = extrude(amount=10.180677042, mode=Mode.PRIVATE)
    cong_2_piece_14 = split(cong_2_piece_14, bisect_by=Plane(origin=(37.123655208, 12.904056519, 4.886525787), z_dir=(0.9413933271437573, -0.3373108412269116, 0)), keep=Keep.TOP, mode=Mode.PRIVATE)
    add(cong_2_piece_14, mode=Mode.SUBTRACT)


solid = part.part
